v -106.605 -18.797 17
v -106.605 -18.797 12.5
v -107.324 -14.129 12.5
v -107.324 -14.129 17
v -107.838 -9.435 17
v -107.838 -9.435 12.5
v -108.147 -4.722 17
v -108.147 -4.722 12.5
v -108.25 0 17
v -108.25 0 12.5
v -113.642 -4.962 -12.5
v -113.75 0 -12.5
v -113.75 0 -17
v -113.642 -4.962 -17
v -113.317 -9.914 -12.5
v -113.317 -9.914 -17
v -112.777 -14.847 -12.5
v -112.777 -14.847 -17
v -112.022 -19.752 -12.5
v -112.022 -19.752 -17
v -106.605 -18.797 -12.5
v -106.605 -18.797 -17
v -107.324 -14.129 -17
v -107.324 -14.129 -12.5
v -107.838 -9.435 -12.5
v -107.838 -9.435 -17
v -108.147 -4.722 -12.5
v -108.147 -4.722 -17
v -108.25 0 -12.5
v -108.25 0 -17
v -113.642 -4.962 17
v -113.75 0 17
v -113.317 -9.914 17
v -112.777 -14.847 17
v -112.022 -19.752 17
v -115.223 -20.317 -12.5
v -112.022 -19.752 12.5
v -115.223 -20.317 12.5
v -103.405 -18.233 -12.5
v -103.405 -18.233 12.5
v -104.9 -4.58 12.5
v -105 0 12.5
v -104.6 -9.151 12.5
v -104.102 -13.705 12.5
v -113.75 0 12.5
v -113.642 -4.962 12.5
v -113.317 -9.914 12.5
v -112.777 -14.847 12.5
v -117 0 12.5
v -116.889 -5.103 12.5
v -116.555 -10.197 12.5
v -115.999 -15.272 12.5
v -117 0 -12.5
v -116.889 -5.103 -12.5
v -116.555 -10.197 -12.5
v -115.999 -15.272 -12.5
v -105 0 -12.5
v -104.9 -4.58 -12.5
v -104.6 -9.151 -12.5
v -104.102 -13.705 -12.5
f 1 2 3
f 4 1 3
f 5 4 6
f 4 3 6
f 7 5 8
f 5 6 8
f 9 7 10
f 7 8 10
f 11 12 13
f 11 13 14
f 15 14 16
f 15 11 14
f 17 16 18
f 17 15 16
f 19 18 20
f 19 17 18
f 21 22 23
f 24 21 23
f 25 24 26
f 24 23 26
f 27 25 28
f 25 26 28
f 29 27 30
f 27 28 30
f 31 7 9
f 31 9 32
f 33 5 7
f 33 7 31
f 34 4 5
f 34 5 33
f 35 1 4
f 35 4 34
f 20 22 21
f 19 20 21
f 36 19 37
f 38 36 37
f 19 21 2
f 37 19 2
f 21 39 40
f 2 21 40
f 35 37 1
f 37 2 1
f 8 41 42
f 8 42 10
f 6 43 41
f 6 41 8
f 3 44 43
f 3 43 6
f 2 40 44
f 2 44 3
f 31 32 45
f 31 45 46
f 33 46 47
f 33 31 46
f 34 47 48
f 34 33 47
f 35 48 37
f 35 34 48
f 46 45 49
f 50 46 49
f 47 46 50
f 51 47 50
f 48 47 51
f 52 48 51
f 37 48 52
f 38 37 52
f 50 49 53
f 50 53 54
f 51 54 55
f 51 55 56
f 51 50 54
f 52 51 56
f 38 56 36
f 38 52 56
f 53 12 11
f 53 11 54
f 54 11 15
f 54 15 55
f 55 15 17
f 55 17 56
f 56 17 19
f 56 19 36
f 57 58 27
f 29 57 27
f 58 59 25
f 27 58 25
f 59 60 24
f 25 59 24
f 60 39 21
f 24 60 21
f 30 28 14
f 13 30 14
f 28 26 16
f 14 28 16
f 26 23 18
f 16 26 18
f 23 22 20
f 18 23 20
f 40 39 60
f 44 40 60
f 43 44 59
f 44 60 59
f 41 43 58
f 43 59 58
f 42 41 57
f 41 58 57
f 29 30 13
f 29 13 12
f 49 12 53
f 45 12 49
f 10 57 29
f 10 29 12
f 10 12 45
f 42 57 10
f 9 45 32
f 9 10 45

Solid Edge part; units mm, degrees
sketch "Sketch1" plane through (0, 0, 0) normal (0, -1, 0) x (1, 0, 0)
  line L0 (-117, 12.5) -> (-113.75, 12.5)
  line L1 (-113.75, 12.5) -> (-113.75, 17)
  line L2 (-113.75, 17) -> (-108.25, 17)
  line L3 (-108.25, 17) -> (-108.25, 12.5)
  line L4 (-108.25, 12.5) -> (-105, 12.5)
  line L5 (-105, 12.5) -> (-105, -12.5)
  line L6 (-105, -12.5) -> (-108.25, -12.5)
  line L7 (-108.25, -12.5) -> (-108.25, -17)
  line L8 (-108.25, -17) -> (-113.75, -17)
  line L9 (-113.75, -17) -> (-113.75, -12.5)
  line L10 (-113.75, -12.5) -> (-117, -12.5)
  line L11 (-117, -12.5) -> (-117, 12.5)
  dimension "D1" = 25
  dimension "D2" = 25
  dimension "D3" = 4.5
  dimension "D4" = 4.5
  dimension "D5" = 4.5
  dimension "D6" = 4.5
  dimension "D7" = 5.5
  dimension "D8" = 5.5
  dimension "D9" = 12
  dimension "D10" = 3.25
  dimension "D11" = 3.25
  dimension "D12" = 3.25
  dimension "D13" = 4.5
  dimension "D14" = 3.25
  dimension "D15" = 105
revolve "RevolvedProtrusion1" add sketch "Sketch1" angle 10 about axis through (0, 0, 54) along (0, 0, 1)
properties material "ABS Plastic, high impact"
